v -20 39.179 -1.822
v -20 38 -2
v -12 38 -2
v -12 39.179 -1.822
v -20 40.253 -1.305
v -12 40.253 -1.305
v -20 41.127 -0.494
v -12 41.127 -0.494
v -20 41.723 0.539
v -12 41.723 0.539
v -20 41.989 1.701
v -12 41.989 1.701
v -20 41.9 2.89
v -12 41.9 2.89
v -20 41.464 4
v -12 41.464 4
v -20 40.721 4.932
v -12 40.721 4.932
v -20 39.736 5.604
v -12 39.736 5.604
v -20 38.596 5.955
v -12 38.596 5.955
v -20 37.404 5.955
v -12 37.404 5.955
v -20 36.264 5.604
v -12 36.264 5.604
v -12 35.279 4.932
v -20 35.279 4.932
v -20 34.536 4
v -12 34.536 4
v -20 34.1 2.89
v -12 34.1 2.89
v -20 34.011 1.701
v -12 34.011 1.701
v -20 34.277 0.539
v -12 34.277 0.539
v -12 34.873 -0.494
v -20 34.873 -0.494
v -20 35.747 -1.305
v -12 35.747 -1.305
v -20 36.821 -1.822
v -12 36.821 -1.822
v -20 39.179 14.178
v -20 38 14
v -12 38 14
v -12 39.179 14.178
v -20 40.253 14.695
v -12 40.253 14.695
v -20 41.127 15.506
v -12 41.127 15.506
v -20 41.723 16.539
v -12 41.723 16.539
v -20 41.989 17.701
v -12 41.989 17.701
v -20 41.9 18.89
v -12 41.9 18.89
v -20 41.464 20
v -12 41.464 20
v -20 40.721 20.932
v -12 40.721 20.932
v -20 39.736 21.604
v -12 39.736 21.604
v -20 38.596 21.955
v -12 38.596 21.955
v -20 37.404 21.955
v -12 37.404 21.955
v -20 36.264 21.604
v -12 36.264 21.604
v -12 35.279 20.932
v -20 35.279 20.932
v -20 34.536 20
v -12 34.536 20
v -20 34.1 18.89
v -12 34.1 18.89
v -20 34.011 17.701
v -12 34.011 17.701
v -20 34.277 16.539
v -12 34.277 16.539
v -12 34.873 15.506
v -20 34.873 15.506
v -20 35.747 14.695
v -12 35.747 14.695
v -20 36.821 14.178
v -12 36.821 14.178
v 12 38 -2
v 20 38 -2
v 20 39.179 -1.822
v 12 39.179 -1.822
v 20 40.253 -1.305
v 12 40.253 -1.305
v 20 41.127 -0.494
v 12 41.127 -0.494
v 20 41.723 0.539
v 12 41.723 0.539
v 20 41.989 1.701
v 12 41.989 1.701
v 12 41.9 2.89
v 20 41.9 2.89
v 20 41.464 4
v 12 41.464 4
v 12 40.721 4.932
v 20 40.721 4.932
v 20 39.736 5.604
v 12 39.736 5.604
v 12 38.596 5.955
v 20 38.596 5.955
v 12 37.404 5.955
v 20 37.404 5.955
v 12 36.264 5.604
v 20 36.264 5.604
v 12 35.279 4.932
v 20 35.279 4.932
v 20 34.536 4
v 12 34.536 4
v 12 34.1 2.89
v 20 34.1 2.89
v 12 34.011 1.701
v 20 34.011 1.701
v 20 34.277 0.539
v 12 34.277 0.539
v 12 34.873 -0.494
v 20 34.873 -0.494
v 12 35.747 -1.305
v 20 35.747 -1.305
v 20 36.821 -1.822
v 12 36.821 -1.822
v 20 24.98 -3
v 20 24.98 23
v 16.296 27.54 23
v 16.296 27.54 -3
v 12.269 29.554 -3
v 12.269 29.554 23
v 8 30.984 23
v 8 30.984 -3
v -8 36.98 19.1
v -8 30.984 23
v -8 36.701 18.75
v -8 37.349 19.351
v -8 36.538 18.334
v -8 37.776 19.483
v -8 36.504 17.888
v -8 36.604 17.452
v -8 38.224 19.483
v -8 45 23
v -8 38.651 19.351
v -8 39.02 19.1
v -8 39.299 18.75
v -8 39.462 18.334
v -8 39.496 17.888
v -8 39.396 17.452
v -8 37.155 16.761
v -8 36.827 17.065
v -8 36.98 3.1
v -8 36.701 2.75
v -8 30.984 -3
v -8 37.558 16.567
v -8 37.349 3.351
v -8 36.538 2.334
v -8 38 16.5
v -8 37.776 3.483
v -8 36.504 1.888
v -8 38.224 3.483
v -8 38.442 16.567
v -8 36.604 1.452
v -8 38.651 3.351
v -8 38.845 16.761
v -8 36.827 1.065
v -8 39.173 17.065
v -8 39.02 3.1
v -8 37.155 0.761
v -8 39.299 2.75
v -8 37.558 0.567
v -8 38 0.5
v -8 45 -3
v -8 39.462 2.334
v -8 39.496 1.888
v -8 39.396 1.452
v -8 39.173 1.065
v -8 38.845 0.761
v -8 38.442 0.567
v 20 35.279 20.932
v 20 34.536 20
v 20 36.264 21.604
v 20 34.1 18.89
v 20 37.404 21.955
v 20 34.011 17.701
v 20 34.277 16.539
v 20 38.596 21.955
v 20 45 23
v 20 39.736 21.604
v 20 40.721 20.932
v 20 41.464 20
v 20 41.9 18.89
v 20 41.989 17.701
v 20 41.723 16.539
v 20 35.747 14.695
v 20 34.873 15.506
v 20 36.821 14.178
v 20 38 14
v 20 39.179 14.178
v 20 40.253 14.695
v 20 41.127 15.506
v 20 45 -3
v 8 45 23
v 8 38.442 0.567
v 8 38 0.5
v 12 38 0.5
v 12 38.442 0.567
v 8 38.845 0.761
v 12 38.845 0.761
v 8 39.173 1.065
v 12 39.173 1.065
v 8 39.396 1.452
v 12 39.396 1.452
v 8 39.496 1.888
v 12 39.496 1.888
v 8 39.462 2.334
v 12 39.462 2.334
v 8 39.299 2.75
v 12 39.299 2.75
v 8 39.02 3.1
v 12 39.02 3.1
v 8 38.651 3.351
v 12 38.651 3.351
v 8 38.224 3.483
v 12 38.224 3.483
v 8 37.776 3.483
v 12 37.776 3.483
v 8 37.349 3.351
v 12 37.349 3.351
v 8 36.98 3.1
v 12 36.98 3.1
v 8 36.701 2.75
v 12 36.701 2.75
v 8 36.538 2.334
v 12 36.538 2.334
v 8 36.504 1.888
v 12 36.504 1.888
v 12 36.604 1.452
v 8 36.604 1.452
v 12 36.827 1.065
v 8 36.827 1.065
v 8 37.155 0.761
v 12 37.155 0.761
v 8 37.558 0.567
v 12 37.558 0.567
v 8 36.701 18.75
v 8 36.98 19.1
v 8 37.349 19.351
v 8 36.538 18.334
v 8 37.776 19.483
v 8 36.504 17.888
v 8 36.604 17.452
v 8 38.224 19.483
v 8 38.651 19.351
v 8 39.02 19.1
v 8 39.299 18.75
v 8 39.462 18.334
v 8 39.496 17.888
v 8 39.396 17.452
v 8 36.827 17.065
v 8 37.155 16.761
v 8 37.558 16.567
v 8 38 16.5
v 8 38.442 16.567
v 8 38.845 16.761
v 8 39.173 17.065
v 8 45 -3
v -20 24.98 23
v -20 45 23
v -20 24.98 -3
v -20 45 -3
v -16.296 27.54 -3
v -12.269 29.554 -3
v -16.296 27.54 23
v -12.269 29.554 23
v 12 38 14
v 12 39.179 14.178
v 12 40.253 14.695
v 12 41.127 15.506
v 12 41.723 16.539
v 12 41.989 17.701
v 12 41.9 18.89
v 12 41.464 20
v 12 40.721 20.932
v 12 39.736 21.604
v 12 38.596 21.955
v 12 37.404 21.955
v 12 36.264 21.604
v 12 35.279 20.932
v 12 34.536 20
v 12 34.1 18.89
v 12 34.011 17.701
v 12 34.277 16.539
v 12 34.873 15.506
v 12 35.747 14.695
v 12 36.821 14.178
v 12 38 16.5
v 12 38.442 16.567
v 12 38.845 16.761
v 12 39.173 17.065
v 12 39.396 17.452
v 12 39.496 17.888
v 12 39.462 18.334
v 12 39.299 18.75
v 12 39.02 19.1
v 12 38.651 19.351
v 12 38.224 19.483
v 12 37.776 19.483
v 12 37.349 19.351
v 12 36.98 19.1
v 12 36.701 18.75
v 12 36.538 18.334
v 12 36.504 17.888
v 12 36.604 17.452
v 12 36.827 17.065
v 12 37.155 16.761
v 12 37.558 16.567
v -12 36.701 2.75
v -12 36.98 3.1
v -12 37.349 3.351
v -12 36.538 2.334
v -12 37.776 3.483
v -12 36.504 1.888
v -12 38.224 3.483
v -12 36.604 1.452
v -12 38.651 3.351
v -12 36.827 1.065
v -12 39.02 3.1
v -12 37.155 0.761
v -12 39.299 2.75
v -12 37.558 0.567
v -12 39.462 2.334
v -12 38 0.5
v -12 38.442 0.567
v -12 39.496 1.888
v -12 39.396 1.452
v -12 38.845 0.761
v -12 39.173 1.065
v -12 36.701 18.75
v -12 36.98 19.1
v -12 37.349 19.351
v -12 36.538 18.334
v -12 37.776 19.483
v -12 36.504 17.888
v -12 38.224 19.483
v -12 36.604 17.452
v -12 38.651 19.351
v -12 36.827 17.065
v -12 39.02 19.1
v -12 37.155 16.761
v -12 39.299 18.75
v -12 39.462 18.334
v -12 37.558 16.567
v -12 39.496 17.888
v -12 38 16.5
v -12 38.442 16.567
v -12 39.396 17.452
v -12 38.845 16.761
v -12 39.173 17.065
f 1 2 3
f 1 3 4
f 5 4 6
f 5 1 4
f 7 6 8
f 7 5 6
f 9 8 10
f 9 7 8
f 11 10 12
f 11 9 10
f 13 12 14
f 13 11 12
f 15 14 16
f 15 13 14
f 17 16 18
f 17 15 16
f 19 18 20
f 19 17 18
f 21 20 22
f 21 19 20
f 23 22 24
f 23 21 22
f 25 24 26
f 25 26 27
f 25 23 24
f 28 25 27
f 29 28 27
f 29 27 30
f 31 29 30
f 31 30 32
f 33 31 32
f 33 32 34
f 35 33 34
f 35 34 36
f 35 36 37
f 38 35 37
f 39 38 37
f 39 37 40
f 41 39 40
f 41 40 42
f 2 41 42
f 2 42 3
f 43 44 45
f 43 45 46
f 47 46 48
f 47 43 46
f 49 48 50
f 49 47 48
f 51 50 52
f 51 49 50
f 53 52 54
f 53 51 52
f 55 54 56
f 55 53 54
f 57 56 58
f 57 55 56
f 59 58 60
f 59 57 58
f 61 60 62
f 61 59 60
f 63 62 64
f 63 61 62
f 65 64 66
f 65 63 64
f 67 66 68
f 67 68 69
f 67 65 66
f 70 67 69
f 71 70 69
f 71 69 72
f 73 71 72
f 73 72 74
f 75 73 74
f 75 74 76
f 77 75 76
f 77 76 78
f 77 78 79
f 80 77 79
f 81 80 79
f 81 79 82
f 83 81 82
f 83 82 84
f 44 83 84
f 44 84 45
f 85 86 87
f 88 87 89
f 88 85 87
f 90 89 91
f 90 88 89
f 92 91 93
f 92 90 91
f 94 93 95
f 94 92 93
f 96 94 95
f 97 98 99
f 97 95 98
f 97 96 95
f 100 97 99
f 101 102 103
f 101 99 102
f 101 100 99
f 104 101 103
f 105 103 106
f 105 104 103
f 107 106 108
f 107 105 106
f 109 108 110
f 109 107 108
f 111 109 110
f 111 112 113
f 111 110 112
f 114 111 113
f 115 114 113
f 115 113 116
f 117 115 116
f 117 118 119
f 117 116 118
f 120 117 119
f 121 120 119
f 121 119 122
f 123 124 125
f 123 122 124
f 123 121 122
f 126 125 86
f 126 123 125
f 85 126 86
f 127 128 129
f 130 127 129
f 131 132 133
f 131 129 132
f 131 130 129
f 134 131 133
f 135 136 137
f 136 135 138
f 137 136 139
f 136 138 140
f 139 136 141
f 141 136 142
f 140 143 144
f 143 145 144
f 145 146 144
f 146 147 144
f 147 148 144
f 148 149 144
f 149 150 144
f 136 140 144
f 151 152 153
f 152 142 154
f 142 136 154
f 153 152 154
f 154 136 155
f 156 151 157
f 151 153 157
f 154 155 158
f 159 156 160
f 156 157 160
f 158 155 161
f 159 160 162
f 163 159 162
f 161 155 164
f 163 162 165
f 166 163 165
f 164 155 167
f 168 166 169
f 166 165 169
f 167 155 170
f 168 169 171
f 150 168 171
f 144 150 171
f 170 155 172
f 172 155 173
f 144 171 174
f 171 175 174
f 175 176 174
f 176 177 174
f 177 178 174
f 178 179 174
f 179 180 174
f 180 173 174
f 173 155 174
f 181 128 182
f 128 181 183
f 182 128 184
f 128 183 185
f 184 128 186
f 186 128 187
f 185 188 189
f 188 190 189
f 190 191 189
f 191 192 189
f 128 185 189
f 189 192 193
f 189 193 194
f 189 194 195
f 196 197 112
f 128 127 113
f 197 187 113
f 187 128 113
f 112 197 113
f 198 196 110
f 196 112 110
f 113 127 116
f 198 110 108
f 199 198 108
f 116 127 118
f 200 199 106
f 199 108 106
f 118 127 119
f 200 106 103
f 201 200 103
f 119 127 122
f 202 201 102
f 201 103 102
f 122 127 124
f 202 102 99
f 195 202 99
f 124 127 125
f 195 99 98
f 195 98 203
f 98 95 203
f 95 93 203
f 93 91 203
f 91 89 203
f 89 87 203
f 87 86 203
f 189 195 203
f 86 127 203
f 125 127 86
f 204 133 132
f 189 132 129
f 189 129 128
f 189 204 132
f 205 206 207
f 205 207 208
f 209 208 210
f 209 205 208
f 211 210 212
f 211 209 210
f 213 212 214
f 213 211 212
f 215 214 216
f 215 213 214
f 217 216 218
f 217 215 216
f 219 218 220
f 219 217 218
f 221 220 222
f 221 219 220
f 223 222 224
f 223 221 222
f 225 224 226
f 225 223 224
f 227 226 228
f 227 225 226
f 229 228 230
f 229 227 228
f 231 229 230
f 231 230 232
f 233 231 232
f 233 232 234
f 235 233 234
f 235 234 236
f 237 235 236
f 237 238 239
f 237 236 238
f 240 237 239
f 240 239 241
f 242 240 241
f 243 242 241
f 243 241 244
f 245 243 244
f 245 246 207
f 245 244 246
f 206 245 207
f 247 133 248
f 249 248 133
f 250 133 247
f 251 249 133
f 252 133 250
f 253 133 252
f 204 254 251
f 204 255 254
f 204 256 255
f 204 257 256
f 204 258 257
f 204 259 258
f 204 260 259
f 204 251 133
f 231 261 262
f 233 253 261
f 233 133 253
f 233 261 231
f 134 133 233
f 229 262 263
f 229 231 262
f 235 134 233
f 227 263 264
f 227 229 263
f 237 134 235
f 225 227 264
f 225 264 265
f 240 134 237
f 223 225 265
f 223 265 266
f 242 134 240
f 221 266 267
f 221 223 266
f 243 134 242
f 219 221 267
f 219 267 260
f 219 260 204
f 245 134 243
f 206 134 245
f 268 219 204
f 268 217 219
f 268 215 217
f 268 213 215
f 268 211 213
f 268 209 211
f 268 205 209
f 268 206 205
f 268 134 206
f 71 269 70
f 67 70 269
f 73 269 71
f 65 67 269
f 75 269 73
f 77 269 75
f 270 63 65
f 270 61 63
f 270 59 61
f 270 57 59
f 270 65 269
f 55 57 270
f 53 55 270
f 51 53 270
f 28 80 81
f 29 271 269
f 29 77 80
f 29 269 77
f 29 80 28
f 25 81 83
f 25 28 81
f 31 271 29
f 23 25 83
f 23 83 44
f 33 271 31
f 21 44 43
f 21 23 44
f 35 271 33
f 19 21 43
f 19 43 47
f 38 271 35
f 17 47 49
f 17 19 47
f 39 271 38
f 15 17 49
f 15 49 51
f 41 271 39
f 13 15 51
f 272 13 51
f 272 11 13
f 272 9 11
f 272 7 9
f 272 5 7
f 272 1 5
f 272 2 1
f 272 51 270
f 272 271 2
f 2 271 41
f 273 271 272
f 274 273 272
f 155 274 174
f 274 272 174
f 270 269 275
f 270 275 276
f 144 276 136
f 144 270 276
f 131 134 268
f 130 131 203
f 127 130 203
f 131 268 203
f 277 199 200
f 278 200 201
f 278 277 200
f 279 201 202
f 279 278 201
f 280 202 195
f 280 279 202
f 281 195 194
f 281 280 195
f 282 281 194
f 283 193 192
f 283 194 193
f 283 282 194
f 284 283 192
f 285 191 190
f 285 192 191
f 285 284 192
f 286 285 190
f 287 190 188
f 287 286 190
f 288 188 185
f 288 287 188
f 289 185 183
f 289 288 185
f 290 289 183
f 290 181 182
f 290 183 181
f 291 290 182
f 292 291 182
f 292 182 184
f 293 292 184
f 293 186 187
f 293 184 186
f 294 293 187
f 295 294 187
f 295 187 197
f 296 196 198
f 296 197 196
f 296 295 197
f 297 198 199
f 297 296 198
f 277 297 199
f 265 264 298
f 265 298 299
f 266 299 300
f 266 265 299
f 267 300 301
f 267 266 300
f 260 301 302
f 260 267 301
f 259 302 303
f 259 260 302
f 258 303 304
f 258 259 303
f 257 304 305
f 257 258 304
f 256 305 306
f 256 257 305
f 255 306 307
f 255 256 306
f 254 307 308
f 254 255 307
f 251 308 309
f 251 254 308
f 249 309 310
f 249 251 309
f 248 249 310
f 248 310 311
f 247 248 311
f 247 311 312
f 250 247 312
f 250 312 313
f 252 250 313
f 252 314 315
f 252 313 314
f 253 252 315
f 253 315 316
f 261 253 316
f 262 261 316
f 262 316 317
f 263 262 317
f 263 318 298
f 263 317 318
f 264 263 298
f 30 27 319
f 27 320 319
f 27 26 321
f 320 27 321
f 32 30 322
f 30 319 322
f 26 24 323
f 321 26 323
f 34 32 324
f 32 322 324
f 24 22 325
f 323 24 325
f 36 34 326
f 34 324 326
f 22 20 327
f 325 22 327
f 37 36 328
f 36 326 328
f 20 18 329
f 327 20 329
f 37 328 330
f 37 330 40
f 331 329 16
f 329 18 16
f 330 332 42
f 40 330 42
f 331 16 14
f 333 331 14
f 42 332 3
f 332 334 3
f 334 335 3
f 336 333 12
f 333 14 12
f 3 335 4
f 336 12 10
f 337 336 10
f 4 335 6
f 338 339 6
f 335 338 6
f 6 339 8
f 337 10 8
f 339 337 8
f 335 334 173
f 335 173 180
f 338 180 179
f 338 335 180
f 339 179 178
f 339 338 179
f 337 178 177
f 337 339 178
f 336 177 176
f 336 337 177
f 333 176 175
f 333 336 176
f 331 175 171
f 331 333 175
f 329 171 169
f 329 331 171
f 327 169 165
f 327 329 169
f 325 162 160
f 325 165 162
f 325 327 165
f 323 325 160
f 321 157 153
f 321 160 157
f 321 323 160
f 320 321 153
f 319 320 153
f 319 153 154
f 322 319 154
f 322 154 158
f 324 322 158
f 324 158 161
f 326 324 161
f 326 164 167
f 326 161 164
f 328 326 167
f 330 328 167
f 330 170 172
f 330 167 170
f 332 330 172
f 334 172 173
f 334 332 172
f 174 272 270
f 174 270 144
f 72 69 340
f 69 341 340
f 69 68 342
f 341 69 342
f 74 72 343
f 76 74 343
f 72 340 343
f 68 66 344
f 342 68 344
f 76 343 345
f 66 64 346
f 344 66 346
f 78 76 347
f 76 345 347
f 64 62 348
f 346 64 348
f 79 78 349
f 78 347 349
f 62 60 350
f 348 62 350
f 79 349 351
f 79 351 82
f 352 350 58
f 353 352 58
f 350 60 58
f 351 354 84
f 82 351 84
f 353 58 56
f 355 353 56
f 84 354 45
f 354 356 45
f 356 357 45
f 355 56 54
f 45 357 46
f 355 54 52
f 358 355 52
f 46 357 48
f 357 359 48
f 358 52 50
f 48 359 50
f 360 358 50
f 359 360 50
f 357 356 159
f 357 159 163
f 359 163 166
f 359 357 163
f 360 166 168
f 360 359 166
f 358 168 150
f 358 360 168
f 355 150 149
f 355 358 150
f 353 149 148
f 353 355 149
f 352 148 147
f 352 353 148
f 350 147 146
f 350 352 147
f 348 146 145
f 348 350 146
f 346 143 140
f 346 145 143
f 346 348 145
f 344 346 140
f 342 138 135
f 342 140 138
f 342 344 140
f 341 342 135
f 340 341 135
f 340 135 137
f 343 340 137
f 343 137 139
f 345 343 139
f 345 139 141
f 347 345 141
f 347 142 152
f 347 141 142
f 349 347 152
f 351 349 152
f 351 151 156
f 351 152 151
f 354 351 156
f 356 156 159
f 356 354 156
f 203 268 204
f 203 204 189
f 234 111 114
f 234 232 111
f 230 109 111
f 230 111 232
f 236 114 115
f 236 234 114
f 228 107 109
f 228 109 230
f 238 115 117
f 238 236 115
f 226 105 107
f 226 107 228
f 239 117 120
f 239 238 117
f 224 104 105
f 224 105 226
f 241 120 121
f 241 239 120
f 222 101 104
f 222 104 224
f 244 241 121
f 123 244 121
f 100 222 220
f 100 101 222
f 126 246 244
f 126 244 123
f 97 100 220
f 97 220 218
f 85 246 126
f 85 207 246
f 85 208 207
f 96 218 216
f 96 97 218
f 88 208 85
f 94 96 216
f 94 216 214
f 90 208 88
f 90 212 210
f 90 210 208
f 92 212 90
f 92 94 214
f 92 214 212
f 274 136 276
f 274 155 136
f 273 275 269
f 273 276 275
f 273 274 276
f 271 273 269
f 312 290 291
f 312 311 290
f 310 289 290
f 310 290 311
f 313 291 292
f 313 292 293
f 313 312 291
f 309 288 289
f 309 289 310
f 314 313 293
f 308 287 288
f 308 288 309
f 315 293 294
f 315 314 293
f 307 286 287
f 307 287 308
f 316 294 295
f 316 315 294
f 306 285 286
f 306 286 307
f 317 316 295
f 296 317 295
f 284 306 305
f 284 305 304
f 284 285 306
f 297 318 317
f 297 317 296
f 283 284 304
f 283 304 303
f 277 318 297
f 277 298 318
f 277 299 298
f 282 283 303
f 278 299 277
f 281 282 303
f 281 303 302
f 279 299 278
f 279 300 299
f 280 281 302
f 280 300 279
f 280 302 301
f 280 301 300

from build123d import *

# Parameters (mm, degrees)
CYLINDER221_R     = 1.5
CYLINDER221_DEPTH = 20
CYLINDER220_R     = 1.5
CYLINDER220_DEPTH = 20
CYLINDER219_R     = 4
CYLINDER219_DEPTH = 20
CYLINDER218_R     = 4
CYLINDER218_DEPTH = 20
CYLINDER212_R     = 4
CYLINDER212_DEPTH = 20
CYLINDER217_R     = 4
CYLINDER217_DEPTH = 20
CYLINDER216_R     = 1.5
CYLINDER216_DEPTH = 20
CYLINDER214_R     = 1.5
CYLINDER214_DEPTH = 20
CYLINDER211_R     = 32
CYLINDER211_DEPTH = 40
BOX094_W          = 16
BOX094_H          = 25
BOX094_DEPTH      = 26
BOX093_W          = 40
BOX093_H          = 30
BOX093_DEPTH      = 26


with BuildPart() as v_lec221:
    # Cylinder221 → Cylinder221 (new body)
    with BuildSketch(Plane(origin=(4, 38, 18), x_dir=(0, 0, -1), z_dir=(1, 0, 0))):
        Circle(CYLINDER221_R)
    extrude(amount=CYLINDER221_DEPTH)


with BuildPart() as compound553:
    # Cylinder220 → Cylinder220 (new body)
    with BuildSketch(Plane(origin=(4, 38, 2), x_dir=(0, 0, -1), z_dir=(1, 0, 0))):
        Circle(CYLINDER220_R)
    extrude(amount=CYLINDER220_DEPTH)

    # Compound553: union Válec221
    add(v_lec221.part)


with BuildPart() as v_lec219:
    # Cylinder219 → Cylinder219 (new body)
    with BuildSketch(Plane(origin=(12, 38, 2), x_dir=(0, 0, -1), z_dir=(1, 0, 0))):
        Circle(CYLINDER219_R)
    extrude(amount=CYLINDER219_DEPTH)


with BuildPart() as compound552:
    # Cylinder218 → Cylinder218 (new body)
    with BuildSketch(Plane(origin=(12, 38, 18), x_dir=(0, 0, -1), z_dir=(1, 0, 0))):
        Circle(CYLINDER218_R)
    extrude(amount=CYLINDER218_DEPTH)

    # Compound552: union Válec219
    add(v_lec219.part)


with BuildPart() as v_lec212:
    # Cylinder212 → Cylinder212 (new body)
    with BuildSketch(Plane(origin=(-32, 38, 2), x_dir=(0, 0, -1), z_dir=(1, 0, 0))):
        Circle(CYLINDER212_R)
    extrude(amount=CYLINDER212_DEPTH)


with BuildPart() as compound550:
    # Cylinder217 → Cylinder217 (new body)
    with BuildSketch(Plane(origin=(-32, 38, 18), x_dir=(0, 0, -1), z_dir=(1, 0, 0))):
        Circle(CYLINDER217_R)
    extrude(amount=CYLINDER217_DEPTH)

    # Compound550: union Válec212
    add(v_lec212.part)


with BuildPart() as v_lec216:
    # Cylinder216 → Cylinder216 (new body)
    with BuildSketch(Plane(origin=(-24, 38, 18), x_dir=(0, 0, -1), z_dir=(1, 0, 0))):
        Circle(CYLINDER216_R)
    extrude(amount=CYLINDER216_DEPTH)


with BuildPart() as compound551:
    # Cylinder214 → Cylinder214 (new body)
    with BuildSketch(Plane(origin=(-24, 38, 2), x_dir=(0, 0, -1), z_dir=(1, 0, 0))):
        Circle(CYLINDER214_R)
    extrude(amount=CYLINDER214_DEPTH)

    # Compound551: union Válec216
    add(v_lec216.part)


with BuildPart() as v_lec211:
    # Cylinder211 → Cylinder211 (new body)
    with BuildSketch(Plane.XY.offset(-8)):
        Circle(CYLINDER211_R)
    extrude(amount=CYLINDER211_DEPTH)


with BuildPart() as krychle094:
    # Box094 → Box094 (new body)
    with BuildSketch(Plane(origin=(-8, 20, -3), x_dir=(1, 0, 0), z_dir=(0, 0, 1))):
        with Locations((8, 12.5)):
            Rectangle(BOX094_W, BOX094_H)
    extrude(amount=BOX094_DEPTH)


with BuildPart() as cut327:
    # Box093 → Box093 (new body)
    with BuildSketch(Plane(origin=(-20, 15, -3), x_dir=(1, 0, 0), z_dir=(0, 0, 1))):
        with Locations((20, 15)):
            Rectangle(BOX093_W, BOX093_H)
    extrude(amount=BOX093_DEPTH)

    # Cut322: cut Krychle094
    add(krychle094.part, mode=Mode.SUBTRACT)

    # Cut323: cut Válec211
    add(v_lec211.part, mode=Mode.SUBTRACT)

    # Cut324: cut Compound551
    add(compound551.part, mode=Mode.SUBTRACT)

    # Cut325: cut Compound550
    add(compound550.part, mode=Mode.SUBTRACT)

    # Cut326: cut Compound552
    add(compound552.part, mode=Mode.SUBTRACT)

    # Cut327: cut Compound553
    add(compound553.part, mode=Mode.SUBTRACT)


solid = cut327.part
